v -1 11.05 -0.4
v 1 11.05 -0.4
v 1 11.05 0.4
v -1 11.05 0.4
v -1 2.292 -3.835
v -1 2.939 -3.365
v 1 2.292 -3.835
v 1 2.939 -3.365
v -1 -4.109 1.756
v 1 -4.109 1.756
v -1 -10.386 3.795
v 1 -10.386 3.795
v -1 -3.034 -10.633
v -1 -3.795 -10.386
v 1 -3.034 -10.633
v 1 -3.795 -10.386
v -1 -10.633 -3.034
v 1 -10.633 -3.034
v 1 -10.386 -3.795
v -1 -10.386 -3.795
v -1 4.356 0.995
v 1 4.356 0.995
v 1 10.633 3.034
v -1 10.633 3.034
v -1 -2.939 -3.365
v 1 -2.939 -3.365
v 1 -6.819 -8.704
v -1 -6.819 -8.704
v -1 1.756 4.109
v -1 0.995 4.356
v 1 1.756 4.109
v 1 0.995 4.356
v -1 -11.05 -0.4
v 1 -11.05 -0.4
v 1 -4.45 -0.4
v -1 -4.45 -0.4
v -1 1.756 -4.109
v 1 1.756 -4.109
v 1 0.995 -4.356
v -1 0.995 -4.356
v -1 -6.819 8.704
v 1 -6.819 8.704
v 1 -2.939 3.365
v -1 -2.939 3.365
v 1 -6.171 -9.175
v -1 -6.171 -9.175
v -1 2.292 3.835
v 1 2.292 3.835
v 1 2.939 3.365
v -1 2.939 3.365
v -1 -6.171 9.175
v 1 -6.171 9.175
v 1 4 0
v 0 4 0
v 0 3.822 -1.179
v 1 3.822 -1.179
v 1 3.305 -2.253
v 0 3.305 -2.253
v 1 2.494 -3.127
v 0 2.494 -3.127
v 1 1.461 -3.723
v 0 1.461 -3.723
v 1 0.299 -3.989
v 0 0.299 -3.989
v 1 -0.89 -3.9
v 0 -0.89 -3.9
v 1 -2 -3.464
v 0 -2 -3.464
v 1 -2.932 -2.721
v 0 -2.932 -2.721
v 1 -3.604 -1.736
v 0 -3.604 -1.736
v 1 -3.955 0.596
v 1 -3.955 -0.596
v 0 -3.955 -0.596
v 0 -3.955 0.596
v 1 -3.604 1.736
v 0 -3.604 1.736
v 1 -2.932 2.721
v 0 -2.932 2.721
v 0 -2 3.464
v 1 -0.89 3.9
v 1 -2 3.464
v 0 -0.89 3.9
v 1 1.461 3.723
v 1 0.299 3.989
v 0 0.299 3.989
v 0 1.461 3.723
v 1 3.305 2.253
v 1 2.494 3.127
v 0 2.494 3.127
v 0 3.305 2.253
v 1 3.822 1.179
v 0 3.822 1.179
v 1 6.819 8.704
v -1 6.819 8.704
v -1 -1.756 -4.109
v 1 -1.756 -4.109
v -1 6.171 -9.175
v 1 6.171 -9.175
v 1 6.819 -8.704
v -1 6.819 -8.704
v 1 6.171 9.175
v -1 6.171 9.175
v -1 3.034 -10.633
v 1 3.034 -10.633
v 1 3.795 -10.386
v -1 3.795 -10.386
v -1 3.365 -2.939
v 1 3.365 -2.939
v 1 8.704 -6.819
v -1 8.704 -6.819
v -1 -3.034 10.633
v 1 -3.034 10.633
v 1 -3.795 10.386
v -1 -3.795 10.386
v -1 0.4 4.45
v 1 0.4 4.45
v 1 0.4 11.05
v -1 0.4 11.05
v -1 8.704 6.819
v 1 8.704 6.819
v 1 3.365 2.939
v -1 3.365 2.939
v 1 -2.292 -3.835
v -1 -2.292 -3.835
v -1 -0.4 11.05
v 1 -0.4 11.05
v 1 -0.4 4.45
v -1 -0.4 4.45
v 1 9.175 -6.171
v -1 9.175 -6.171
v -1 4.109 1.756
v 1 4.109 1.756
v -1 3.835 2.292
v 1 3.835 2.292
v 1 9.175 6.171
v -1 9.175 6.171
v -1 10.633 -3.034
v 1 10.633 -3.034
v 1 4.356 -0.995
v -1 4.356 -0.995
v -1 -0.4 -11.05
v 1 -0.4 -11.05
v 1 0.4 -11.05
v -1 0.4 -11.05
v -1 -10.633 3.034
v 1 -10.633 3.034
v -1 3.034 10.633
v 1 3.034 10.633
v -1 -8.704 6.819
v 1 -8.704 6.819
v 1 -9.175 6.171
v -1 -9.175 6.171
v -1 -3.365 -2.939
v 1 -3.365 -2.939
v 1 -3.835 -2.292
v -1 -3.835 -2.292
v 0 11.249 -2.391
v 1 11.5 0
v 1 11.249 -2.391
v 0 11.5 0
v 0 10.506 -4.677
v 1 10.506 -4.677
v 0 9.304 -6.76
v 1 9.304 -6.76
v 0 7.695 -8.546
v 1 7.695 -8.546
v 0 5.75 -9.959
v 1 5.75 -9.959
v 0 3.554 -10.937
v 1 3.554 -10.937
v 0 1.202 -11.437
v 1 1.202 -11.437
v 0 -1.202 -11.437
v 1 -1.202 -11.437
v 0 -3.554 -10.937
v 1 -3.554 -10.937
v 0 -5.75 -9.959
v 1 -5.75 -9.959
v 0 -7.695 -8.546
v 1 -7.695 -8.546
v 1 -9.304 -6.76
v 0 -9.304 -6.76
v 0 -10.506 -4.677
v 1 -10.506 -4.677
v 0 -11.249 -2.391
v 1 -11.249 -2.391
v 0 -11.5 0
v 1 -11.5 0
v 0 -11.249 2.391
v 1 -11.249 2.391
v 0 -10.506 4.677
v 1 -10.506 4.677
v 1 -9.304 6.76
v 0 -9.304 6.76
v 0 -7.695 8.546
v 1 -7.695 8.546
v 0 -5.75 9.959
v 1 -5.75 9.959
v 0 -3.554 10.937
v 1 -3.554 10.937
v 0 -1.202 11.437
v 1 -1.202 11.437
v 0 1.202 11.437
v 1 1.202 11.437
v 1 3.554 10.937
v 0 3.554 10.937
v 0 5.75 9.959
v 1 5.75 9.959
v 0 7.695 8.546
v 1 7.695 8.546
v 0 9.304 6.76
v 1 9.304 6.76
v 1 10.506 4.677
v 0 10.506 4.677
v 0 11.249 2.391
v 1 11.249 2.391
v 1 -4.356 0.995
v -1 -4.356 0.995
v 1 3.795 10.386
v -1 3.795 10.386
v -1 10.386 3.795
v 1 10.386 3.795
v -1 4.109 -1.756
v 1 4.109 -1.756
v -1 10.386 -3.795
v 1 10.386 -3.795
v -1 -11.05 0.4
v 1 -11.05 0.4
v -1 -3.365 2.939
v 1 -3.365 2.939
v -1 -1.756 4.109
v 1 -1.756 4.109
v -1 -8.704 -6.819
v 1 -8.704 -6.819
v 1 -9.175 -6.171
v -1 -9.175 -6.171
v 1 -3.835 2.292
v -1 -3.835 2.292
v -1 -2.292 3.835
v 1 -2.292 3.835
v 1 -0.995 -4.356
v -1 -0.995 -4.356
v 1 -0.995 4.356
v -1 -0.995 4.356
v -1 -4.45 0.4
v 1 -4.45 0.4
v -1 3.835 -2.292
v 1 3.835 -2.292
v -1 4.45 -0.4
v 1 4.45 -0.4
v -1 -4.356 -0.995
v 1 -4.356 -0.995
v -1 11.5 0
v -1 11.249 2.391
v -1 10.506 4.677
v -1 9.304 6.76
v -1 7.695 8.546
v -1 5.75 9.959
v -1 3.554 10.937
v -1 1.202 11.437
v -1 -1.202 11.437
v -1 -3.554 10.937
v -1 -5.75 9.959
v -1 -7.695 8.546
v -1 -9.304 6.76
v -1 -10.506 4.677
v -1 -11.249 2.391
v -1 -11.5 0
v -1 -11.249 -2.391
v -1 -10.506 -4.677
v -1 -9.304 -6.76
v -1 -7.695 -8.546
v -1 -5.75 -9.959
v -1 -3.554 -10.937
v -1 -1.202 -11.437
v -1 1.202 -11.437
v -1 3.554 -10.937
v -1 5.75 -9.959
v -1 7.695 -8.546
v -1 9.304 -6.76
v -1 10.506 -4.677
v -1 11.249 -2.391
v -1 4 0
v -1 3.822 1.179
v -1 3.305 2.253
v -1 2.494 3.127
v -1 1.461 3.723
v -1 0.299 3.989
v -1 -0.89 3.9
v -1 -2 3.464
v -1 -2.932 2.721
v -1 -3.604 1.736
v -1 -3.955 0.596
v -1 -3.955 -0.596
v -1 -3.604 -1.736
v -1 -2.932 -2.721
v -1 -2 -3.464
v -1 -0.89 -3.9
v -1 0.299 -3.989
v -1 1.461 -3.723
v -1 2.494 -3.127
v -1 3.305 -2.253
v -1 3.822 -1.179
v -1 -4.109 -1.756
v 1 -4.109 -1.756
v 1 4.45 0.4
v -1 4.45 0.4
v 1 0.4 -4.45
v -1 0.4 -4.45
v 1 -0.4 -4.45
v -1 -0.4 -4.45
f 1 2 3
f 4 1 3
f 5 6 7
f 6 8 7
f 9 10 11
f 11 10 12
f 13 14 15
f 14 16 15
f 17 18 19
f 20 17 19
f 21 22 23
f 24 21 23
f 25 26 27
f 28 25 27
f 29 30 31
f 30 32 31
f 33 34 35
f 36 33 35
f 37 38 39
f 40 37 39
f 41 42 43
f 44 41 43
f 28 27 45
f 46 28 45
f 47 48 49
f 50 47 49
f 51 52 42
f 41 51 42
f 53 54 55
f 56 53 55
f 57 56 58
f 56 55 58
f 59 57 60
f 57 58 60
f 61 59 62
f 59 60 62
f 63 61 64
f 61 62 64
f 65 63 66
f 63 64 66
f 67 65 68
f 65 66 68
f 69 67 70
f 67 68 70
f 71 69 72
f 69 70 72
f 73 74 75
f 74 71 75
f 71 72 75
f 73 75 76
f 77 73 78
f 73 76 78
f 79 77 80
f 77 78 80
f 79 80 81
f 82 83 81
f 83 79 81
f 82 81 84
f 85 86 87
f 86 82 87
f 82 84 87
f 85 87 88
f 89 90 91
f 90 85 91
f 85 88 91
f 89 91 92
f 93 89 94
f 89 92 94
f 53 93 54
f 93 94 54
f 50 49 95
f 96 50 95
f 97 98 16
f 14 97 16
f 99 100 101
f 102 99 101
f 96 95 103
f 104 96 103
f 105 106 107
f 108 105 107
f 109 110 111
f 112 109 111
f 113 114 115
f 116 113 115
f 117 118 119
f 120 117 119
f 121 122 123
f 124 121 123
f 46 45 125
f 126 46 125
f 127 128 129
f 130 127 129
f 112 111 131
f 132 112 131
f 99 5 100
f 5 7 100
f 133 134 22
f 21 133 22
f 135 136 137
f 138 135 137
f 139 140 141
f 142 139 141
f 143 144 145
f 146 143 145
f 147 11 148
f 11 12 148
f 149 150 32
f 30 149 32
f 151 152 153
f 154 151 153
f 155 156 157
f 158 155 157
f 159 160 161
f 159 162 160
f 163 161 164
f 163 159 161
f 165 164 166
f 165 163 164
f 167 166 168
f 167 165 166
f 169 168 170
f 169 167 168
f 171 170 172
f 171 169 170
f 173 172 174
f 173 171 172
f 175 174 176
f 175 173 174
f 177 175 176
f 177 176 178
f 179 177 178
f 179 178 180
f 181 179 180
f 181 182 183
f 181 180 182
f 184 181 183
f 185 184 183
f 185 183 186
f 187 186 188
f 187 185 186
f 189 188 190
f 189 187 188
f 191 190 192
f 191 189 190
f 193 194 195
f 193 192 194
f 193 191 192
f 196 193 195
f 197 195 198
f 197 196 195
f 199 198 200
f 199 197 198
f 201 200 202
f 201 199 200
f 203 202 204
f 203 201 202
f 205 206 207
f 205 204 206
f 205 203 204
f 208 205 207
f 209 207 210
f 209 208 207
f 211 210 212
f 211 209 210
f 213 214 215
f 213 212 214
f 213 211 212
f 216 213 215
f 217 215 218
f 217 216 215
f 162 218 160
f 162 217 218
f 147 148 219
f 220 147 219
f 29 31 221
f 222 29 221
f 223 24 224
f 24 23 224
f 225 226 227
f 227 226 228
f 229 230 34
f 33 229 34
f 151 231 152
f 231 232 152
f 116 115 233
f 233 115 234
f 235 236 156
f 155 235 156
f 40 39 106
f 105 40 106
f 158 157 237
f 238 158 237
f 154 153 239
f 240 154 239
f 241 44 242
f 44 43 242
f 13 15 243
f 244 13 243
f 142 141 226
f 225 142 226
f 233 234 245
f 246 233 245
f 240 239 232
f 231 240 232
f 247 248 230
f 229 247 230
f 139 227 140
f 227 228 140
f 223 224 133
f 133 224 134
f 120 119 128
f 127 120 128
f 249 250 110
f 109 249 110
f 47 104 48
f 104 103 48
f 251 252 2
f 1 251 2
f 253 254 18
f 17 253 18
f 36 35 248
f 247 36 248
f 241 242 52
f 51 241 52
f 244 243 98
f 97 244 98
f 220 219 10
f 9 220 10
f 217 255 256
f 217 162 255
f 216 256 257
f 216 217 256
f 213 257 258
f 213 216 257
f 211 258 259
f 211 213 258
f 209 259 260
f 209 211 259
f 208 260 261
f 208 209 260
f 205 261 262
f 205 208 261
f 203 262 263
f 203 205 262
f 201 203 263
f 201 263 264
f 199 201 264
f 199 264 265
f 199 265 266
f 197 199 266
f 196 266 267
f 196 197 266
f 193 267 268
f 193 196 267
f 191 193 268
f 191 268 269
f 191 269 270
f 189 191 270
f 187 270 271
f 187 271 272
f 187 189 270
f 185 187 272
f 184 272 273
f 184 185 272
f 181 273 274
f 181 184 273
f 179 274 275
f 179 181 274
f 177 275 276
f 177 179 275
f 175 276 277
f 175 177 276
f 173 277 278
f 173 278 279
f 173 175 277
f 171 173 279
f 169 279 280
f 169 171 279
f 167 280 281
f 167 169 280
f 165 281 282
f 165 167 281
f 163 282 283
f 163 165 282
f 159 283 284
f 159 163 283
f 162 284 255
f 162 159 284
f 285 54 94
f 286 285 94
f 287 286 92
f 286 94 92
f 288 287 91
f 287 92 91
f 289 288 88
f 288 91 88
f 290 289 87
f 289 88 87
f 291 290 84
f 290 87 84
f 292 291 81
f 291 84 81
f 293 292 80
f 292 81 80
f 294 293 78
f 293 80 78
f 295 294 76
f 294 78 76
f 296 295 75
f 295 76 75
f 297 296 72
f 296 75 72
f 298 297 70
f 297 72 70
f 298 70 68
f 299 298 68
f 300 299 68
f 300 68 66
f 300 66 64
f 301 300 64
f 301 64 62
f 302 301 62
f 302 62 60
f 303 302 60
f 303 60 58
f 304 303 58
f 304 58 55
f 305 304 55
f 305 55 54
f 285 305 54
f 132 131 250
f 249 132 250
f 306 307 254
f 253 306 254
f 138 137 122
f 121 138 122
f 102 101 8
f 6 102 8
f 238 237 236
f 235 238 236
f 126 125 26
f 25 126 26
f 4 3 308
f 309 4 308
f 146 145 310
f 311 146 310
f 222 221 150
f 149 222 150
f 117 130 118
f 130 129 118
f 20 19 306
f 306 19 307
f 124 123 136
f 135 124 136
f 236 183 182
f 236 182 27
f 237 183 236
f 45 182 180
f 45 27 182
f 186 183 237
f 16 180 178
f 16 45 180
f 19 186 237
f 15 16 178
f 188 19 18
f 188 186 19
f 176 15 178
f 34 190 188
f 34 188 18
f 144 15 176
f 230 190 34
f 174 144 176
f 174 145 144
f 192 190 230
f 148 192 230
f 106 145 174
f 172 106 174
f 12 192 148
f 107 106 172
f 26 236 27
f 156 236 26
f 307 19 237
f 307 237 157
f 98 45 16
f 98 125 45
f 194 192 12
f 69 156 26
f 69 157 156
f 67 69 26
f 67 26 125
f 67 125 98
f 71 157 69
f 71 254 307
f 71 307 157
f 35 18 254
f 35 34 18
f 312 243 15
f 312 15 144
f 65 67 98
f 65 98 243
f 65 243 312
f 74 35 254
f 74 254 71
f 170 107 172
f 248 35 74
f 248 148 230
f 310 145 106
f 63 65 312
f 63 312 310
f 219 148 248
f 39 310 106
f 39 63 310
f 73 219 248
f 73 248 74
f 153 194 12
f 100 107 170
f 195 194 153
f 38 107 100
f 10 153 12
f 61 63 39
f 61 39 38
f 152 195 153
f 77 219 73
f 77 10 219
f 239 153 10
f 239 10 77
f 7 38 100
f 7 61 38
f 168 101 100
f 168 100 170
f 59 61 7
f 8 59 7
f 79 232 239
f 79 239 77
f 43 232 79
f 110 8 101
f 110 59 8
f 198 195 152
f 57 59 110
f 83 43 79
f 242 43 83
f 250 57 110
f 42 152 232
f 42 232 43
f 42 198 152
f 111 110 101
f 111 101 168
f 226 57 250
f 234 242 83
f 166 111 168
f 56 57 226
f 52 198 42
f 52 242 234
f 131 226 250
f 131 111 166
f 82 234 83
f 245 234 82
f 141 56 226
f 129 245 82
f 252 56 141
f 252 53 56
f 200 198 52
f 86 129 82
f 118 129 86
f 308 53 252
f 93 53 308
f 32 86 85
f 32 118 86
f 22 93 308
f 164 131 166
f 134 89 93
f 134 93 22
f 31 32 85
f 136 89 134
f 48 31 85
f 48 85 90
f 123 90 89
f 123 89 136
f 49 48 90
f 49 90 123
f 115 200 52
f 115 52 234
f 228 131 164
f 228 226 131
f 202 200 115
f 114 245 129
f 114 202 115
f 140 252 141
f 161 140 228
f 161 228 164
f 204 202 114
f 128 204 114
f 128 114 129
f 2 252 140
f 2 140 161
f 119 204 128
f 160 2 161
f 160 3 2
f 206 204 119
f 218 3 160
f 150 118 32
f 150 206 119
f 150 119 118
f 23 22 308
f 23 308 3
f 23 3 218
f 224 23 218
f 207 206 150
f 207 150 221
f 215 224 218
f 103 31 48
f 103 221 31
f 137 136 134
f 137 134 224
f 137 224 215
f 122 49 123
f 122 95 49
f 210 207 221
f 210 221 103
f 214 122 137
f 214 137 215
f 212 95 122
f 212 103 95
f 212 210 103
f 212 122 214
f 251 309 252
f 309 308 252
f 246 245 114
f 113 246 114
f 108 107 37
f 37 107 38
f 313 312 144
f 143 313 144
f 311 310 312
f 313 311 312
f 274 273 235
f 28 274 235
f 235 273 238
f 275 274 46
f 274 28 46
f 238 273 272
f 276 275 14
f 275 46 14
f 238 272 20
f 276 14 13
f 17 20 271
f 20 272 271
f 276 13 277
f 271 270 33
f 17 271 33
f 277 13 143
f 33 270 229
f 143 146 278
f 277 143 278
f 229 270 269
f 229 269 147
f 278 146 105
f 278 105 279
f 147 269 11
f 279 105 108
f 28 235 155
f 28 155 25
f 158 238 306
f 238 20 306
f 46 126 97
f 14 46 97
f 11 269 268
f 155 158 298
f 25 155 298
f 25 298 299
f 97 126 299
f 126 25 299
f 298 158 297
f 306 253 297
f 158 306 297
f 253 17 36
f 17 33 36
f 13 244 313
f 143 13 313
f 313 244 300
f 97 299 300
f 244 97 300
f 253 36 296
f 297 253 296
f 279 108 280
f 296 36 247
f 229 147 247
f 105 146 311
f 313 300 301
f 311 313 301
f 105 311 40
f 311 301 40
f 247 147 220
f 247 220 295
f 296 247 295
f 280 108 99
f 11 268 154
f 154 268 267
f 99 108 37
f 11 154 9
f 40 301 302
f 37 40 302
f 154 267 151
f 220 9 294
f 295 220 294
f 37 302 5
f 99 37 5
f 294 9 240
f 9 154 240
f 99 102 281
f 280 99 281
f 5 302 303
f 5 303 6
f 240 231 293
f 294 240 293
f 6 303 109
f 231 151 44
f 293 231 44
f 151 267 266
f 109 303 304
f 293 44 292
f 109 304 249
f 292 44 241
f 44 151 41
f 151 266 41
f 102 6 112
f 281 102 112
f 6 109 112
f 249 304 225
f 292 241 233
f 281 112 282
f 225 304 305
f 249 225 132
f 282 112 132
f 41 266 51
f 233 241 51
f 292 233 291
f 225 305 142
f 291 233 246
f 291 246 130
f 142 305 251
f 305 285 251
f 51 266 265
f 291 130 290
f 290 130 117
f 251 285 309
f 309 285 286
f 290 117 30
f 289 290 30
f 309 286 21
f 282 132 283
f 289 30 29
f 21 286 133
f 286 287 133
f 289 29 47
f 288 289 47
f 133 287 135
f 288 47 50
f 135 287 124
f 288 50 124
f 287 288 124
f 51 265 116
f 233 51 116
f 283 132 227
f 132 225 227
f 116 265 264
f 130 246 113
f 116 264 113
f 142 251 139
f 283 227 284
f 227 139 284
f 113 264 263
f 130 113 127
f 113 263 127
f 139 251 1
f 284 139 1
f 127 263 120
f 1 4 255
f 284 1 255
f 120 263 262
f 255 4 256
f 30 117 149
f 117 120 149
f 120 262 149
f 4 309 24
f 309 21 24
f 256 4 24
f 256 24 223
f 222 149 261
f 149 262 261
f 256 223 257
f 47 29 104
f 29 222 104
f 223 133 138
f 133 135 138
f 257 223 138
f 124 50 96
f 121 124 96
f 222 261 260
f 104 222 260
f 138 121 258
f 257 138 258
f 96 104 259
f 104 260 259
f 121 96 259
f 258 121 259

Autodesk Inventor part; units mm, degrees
ref_plane "YZ Plane" through (0, 0, 0) normal (1, 0, 0) x (0, 1, 0)
ref_plane "XZ Plane" through (0, 0, 0) normal (0, 1, 0) x (-1, 0, 0)
ref_plane "XY Plane" through (0, 0, 0) normal (0, 0, 1) x (1, 0, 0)
sketch "Sketch1" plane through (0, 0, 0) normal (1, 0, 0) x (0, 1, 0)
  circle A0 centre (0, 0) radius 4
  circle A1 centre (0, 0) radius 11.5
  dimension "d0" = 8
  dimension "d1" = 23
extrude "Extrusion1" add sketch "Sketch1" along normal mid plane 2
sketch "Sketch4" plane through (1, 0, 0) normal (1, 0, 0) x (0, 0, -1)
  circle A0 centre (0, 0) radius 11.5 construction
  circle A1 centre (0, 0) radius 4 construction
  line L0 (-11.5, 0) -> (-4, 0) construction
  line L1 (-11.05, -0.4) -> (-4.45, -0.4)
  line L2 (-4.45, -0.4) -> (-4.45, 0.4)
  line L3 (-4.45, 0.4) -> (-11.05, 0.4)
  line L4 (-11.05, 0.4) -> (-11.05, -0.4)
  line L5 (-11.05, -0.4) -> (-4.45, 0.4) construction
  line L6 (-4.45, -0.4) -> (-11.05, 0.4) construction
  line L7 (-4.3558, -0.9947) -> (-10.6328, -3.0342)
  line L8 (-4.1086, -1.7555) -> (-4.3558, -0.9947)
  line L9 (-10.3856, -3.7951) -> (-4.1086, -1.7555)
  line L10 (-10.6328, -3.0342) -> (-10.3856, -3.7951)
  line L11 (-3.8352, -2.292) -> (-9.1748, -6.1714)
  line L12 (-3.365, -2.9393) -> (-3.8352, -2.292)
  line L13 (-8.7045, -6.8186) -> (-3.365, -2.9393)
  line L14 (-9.1748, -6.1714) -> (-8.7045, -6.8186)
  line L15 (-2.9393, -3.365) -> (-6.8186, -8.7045)
  line L16 (-2.292, -3.8352) -> (-2.9393, -3.365)
  line L17 (-6.1714, -9.1748) -> (-2.292, -3.8352)
  line L18 (-6.8186, -8.7045) -> (-6.1714, -9.1748)
  line L19 (-1.7555, -4.1086) -> (-3.7951, -10.3856)
  line L20 (-0.9947, -4.3558) -> (-1.7555, -4.1086)
  line L21 (-3.0342, -10.6328) -> (-0.9947, -4.3558)
  line L22 (-3.7951, -10.3856) -> (-3.0342, -10.6328)
  line L23 (-0.4, -4.45) -> (-0.4, -11.05)
  line L24 (0.4, -4.45) -> (-0.4, -4.45)
  line L25 (0.4, -11.05) -> (0.4, -4.45)
  line L26 (-0.4, -11.05) -> (0.4, -11.05)
  line L27 (0.9947, -4.3558) -> (3.0342, -10.6328)
  line L28 (1.7555, -4.1086) -> (0.9947, -4.3558)
  line L29 (3.7951, -10.3856) -> (1.7555, -4.1086)
  line L30 (3.0342, -10.6328) -> (3.7951, -10.3856)
  line L31 (2.292, -3.8352) -> (6.1714, -9.1748)
  line L32 (2.9393, -3.365) -> (2.292, -3.8352)
  line L33 (6.8186, -8.7045) -> (2.9393, -3.365)
  line L34 (6.1714, -9.1748) -> (6.8186, -8.7045)
  line L35 (3.365, -2.9393) -> (8.7045, -6.8186)
  line L36 (3.8352, -2.292) -> (3.365, -2.9393)
  line L37 (9.1748, -6.1714) -> (3.8352, -2.292)
  line L38 (8.7045, -6.8186) -> (9.1748, -6.1714)
  line L39 (4.1086, -1.7555) -> (10.3856, -3.7951)
  line L40 (4.3558, -0.9947) -> (4.1086, -1.7555)
  line L41 (10.6328, -3.0342) -> (4.3558, -0.9947)
  line L42 (10.3856, -3.7951) -> (10.6328, -3.0342)
  line L43 (4.45, -0.4) -> (11.05, -0.4)
  line L44 (4.45, 0.4) -> (4.45, -0.4)
  line L45 (11.05, 0.4) -> (4.45, 0.4)
  line L46 (11.05, -0.4) -> (11.05, 0.4)
  line L47 (4.3558, 0.9947) -> (10.6328, 3.0342)
  line L48 (4.1086, 1.7555) -> (4.3558, 0.9947)
  line L49 (10.3856, 3.7951) -> (4.1086, 1.7555)
  line L50 (10.6328, 3.0342) -> (10.3856, 3.7951)
  line L51 (3.8352, 2.292) -> (9.1748, 6.1714)
  line L52 (3.365, 2.9393) -> (3.8352, 2.292)
  line L53 (8.7045, 6.8186) -> (3.365, 2.9393)
  line L54 (9.1748, 6.1714) -> (8.7045, 6.8186)
  line L55 (2.9393, 3.365) -> (6.8186, 8.7045)
  line L56 (2.292, 3.8352) -> (2.9393, 3.365)
  line L57 (6.1714, 9.1748) -> (2.292, 3.8352)
  line L58 (6.8186, 8.7045) -> (6.1714, 9.1748)
  line L59 (1.7555, 4.1086) -> (3.7951, 10.3856)
  line L60 (0.9947, 4.3558) -> (1.7555, 4.1086)
  line L61 (3.0342, 10.6328) -> (0.9947, 4.3558)
  line L62 (3.7951, 10.3856) -> (3.0342, 10.6328)
  line L63 (0.4, 4.45) -> (0.4, 11.05)
  line L64 (-0.4, 4.45) -> (0.4, 4.45)
  line L65 (-0.4, 11.05) -> (-0.4, 4.45)
  line L66 (0.4, 11.05) -> (-0.4, 11.05)
  line L67 (-0.9947, 4.3558) -> (-3.0342, 10.6328)
  line L68 (-1.7555, 4.1086) -> (-0.9947, 4.3558)
  line L69 (-3.7951, 10.3856) -> (-1.7555, 4.1086)
  line L70 (-3.0342, 10.6328) -> (-3.7951, 10.3856)
  line L71 (-2.292, 3.8352) -> (-6.1714, 9.1748)
  line L72 (-2.9393, 3.365) -> (-2.292, 3.8352)
  line L73 (-6.8186, 8.7045) -> (-2.9393, 3.365)
  line L74 (-6.1714, 9.1748) -> (-6.8186, 8.7045)
  line L75 (-3.365, 2.9393) -> (-8.7045, 6.8186)
  line L76 (-3.8352, 2.292) -> (-3.365, 2.9393)
  line L77 (-9.1748, 6.1714) -> (-3.8352, 2.292)
  line L78 (-8.7045, 6.8186) -> (-9.1748, 6.1714)
  line L79 (-4.1086, 1.7555) -> (-10.3856, 3.7951)
  line L80 (-4.3558, 0.9947) -> (-4.1086, 1.7555)
  line L81 (-10.6328, 3.0342) -> (-4.3558, 0.9947)
  line L82 (-10.3856, 3.7951) -> (-10.6328, 3.0342)
  point P0 (-7.75, 0)
  dimension "d15" = 6.6
  dimension "d16" = 0.8
  dimension "d19" = 360
extrude "Extrusion4" cut sketch "Sketch4" against normal blind 5
properties part number "encoder"
